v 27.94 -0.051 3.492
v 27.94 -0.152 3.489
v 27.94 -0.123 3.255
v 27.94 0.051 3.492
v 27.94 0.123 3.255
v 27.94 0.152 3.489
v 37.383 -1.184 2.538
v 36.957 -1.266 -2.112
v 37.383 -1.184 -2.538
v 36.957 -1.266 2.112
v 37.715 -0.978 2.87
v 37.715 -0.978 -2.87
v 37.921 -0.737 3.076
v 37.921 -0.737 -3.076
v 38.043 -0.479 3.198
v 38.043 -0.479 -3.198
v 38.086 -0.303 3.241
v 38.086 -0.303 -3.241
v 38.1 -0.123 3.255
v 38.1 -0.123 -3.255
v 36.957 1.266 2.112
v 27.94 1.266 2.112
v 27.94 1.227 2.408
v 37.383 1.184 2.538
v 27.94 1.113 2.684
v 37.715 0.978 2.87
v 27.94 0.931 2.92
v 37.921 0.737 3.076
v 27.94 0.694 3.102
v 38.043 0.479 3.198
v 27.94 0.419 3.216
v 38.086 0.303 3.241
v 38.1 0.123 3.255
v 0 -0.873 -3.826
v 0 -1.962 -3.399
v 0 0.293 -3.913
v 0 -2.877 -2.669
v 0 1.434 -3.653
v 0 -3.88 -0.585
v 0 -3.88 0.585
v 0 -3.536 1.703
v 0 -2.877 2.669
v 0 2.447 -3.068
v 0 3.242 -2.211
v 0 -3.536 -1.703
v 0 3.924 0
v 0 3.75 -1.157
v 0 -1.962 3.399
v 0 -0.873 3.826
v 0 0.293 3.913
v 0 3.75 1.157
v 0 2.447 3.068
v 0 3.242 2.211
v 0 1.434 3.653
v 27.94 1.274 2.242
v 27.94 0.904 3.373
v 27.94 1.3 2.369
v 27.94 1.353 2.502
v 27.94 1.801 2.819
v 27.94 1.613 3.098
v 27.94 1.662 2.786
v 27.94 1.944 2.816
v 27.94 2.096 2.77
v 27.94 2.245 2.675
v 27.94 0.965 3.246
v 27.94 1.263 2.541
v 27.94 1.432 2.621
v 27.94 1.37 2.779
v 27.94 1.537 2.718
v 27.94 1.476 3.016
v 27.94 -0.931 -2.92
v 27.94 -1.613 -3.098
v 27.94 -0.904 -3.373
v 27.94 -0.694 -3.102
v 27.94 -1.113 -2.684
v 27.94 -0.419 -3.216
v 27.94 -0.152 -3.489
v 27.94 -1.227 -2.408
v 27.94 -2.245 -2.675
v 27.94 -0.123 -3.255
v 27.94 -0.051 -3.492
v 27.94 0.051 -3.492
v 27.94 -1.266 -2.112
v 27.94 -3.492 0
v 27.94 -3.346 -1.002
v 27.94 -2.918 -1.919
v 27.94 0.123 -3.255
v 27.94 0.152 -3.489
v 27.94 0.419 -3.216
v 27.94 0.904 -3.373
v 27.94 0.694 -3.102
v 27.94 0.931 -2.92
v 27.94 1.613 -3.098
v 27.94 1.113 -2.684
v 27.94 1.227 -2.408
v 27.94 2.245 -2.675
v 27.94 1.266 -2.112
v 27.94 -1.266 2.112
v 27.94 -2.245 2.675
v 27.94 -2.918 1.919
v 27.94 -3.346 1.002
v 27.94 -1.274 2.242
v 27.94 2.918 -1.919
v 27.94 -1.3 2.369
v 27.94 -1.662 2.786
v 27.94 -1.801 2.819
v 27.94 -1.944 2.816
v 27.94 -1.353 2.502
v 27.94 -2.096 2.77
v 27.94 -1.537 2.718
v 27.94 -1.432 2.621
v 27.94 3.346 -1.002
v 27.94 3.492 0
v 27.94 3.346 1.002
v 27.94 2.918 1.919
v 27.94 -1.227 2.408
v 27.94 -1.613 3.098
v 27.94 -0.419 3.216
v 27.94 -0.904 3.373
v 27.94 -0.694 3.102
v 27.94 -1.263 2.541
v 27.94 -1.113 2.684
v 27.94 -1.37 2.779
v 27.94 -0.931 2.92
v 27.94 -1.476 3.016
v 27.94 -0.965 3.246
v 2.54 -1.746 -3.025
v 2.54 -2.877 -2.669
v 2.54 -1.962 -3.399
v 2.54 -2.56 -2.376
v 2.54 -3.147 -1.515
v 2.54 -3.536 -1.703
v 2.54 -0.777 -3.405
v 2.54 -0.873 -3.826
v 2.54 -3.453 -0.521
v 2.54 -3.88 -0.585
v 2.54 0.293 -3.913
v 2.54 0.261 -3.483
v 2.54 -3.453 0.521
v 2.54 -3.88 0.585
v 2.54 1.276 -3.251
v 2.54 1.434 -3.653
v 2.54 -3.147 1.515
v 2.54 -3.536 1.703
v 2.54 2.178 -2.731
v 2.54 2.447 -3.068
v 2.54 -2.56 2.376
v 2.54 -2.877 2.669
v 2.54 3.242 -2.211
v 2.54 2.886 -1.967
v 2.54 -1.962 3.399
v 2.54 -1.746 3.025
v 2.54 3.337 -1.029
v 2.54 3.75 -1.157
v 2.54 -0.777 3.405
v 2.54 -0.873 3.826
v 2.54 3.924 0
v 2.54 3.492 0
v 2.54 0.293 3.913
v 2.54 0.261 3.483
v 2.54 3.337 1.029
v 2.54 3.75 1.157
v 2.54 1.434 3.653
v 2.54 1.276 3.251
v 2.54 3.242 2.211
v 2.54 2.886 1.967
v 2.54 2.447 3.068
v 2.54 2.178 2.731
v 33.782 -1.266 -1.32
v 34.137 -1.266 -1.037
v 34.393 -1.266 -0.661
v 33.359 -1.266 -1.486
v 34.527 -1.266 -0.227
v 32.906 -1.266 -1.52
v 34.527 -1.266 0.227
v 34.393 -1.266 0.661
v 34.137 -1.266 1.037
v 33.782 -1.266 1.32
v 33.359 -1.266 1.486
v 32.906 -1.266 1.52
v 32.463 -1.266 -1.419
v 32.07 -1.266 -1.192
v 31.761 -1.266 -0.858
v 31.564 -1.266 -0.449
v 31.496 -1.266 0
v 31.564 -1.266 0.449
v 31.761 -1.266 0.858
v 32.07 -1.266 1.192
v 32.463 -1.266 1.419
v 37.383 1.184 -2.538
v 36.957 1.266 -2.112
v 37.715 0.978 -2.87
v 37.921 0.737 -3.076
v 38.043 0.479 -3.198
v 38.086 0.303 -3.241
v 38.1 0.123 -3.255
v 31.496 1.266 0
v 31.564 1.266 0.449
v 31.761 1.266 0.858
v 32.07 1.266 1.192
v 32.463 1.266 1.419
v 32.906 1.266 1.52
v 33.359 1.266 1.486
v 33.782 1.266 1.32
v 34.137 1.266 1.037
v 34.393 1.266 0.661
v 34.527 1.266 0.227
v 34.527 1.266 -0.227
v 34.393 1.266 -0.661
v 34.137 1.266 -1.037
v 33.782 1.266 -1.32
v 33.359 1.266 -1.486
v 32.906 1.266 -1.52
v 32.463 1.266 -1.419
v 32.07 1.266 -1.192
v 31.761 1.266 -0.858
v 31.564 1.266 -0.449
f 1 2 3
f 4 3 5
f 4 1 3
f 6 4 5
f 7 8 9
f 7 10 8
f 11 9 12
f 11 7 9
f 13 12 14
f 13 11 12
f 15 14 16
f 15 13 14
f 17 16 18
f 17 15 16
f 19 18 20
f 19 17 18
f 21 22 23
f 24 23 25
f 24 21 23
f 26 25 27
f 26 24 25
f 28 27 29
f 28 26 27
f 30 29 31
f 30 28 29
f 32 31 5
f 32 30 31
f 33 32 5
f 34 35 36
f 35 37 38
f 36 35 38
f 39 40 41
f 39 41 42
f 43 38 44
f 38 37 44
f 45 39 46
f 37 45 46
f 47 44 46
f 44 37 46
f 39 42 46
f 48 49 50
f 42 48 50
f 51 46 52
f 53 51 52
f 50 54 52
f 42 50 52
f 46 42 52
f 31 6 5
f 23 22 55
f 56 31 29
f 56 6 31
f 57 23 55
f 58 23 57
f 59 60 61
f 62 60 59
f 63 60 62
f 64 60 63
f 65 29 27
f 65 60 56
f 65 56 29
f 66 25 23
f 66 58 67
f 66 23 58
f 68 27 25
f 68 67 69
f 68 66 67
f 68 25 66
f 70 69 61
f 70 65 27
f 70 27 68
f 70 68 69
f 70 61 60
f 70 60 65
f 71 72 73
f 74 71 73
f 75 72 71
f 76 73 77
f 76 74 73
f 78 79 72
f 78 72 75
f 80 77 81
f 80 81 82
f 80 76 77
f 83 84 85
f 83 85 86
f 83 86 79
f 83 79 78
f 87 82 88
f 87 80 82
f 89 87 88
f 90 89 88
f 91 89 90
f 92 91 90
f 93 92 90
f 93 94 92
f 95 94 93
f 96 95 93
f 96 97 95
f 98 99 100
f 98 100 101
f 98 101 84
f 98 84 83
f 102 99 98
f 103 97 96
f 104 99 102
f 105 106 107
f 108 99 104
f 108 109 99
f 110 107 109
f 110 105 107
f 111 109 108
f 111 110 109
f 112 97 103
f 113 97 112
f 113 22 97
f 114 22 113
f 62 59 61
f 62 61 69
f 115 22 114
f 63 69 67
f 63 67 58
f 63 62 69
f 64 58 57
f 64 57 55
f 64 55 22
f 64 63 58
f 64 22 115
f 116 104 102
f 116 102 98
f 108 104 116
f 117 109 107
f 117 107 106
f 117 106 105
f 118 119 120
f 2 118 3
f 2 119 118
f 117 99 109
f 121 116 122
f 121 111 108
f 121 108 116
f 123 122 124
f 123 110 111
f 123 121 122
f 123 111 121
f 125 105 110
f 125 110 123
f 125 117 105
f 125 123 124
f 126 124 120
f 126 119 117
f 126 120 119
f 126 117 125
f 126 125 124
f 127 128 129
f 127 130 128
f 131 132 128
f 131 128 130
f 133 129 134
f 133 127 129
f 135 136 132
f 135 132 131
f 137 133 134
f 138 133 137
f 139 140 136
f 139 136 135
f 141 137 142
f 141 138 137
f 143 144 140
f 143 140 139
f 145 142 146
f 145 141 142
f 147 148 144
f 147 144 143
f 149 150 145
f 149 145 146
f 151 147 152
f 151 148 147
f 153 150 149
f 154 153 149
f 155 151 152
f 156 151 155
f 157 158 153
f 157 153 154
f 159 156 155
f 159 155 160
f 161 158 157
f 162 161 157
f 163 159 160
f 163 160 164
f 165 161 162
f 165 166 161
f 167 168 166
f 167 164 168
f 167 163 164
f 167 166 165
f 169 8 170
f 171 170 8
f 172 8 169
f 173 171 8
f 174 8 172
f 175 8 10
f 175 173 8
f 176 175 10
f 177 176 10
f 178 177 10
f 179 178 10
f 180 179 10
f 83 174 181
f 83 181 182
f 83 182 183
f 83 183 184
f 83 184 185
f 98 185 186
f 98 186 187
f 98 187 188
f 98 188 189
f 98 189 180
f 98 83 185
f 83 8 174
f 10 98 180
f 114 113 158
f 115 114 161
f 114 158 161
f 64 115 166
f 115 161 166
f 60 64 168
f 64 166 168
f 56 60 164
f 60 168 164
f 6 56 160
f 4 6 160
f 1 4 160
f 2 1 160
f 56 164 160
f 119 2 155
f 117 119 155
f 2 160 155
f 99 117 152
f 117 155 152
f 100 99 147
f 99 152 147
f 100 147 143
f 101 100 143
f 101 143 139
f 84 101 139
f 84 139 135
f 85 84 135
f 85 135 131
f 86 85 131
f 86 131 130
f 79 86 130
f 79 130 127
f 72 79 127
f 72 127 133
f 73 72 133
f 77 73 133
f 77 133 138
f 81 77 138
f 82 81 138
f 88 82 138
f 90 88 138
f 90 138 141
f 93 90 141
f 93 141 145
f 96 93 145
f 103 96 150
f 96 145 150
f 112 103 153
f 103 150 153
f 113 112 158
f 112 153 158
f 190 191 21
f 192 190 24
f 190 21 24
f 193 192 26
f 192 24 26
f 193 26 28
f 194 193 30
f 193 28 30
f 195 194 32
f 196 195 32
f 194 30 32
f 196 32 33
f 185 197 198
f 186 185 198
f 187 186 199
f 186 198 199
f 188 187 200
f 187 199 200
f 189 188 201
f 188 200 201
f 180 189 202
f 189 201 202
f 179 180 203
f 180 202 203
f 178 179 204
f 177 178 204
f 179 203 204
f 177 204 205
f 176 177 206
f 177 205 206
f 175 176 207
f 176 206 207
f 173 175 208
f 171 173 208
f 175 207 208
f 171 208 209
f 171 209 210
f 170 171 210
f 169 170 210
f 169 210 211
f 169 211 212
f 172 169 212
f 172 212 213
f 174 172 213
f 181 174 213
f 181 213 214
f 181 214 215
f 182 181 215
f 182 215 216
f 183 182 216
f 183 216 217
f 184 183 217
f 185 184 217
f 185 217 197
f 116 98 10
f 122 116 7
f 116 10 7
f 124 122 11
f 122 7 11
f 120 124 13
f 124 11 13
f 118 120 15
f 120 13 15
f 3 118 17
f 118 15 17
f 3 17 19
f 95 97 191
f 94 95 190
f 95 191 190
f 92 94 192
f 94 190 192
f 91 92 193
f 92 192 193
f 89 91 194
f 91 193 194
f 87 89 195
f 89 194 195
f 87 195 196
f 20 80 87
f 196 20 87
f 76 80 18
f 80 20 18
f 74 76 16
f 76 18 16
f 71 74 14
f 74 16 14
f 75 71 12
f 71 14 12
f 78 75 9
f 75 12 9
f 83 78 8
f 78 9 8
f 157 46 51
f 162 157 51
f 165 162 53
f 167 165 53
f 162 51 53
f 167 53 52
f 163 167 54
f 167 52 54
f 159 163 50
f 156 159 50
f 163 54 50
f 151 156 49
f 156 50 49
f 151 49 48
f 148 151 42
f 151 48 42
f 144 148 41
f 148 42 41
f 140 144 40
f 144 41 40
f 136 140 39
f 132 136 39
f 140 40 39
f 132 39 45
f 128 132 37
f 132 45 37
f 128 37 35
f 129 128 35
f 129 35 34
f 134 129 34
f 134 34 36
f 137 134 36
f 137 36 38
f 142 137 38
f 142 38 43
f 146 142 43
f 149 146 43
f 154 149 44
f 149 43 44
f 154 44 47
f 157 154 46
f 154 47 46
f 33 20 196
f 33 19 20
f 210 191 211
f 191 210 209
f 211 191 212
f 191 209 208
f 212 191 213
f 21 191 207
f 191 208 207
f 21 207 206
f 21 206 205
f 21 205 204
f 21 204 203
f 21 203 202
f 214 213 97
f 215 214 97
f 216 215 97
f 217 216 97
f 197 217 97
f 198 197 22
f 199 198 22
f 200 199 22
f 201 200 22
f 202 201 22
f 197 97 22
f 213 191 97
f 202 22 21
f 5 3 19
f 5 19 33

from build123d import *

# Parameters (mm, degrees)
F0_R     = 3.9243
F1_DEPTH = 2.54
F2_R     = 3.4925
F3_DEPTH = 25.4
F4_W     = 2.531840682
F4_H     = 6.5099929156
F5_DEPTH = 10.16
F6_R     = 1.524
F7_DEPTH = 25.4
F8_R     = 1.14299


# Not quite as in the source:
# - a fillet or chamfer is up to 0.001 mm smaller than in the source, because OpenCascade refuses the exact size


with BuildPart() as f1:
    # F0 (on Right) → F1 (new body)
    with BuildSketch(Plane.YZ):
        Circle(F0_R)
    extrude(amount=F1_DEPTH)

    # F2 (on face) → F3 (join)
    with BuildSketch(Plane.YZ.offset(2.54)):
        Circle(F2_R)
    extrude(amount=F3_DEPTH)

    # F4 (on face) → F5 (join)
    with BuildSketch(Plane.YZ.offset(27.94)):
        Rectangle(F4_W, F4_H)
    extrude(amount=F5_DEPTH)

    # F6 (on face) → F7 (cut)
    with BuildSketch(Plane(origin=(0, 1.265920341, 0), x_dir=(-1, 0, 0), z_dir=(0, 1, 0))):
        with Locations((-33.02, 0)):
            Circle(F6_R)
    extrude(amount=-F7_DEPTH, mode=Mode.SUBTRACT)

    # F8 (radius 1.143 in the source; OpenCascade refuses exactly that, so slightly less here)
    f8_edges = [f1.edges().sort_by_distance(p)[0] for p in [
        (38.1, 1.26592, 0),
        (38.1, -1.26592, 0),
        (33.02, 1.26592, 3.254996),
        (33.02, -1.26592, 3.254996),
        (33.02, 1.26592, -3.254996),
        (33.02, -1.26592, -3.254996),
    ]]
    fillet(f8_edges, radius=F8_R)


solid = f1.part
